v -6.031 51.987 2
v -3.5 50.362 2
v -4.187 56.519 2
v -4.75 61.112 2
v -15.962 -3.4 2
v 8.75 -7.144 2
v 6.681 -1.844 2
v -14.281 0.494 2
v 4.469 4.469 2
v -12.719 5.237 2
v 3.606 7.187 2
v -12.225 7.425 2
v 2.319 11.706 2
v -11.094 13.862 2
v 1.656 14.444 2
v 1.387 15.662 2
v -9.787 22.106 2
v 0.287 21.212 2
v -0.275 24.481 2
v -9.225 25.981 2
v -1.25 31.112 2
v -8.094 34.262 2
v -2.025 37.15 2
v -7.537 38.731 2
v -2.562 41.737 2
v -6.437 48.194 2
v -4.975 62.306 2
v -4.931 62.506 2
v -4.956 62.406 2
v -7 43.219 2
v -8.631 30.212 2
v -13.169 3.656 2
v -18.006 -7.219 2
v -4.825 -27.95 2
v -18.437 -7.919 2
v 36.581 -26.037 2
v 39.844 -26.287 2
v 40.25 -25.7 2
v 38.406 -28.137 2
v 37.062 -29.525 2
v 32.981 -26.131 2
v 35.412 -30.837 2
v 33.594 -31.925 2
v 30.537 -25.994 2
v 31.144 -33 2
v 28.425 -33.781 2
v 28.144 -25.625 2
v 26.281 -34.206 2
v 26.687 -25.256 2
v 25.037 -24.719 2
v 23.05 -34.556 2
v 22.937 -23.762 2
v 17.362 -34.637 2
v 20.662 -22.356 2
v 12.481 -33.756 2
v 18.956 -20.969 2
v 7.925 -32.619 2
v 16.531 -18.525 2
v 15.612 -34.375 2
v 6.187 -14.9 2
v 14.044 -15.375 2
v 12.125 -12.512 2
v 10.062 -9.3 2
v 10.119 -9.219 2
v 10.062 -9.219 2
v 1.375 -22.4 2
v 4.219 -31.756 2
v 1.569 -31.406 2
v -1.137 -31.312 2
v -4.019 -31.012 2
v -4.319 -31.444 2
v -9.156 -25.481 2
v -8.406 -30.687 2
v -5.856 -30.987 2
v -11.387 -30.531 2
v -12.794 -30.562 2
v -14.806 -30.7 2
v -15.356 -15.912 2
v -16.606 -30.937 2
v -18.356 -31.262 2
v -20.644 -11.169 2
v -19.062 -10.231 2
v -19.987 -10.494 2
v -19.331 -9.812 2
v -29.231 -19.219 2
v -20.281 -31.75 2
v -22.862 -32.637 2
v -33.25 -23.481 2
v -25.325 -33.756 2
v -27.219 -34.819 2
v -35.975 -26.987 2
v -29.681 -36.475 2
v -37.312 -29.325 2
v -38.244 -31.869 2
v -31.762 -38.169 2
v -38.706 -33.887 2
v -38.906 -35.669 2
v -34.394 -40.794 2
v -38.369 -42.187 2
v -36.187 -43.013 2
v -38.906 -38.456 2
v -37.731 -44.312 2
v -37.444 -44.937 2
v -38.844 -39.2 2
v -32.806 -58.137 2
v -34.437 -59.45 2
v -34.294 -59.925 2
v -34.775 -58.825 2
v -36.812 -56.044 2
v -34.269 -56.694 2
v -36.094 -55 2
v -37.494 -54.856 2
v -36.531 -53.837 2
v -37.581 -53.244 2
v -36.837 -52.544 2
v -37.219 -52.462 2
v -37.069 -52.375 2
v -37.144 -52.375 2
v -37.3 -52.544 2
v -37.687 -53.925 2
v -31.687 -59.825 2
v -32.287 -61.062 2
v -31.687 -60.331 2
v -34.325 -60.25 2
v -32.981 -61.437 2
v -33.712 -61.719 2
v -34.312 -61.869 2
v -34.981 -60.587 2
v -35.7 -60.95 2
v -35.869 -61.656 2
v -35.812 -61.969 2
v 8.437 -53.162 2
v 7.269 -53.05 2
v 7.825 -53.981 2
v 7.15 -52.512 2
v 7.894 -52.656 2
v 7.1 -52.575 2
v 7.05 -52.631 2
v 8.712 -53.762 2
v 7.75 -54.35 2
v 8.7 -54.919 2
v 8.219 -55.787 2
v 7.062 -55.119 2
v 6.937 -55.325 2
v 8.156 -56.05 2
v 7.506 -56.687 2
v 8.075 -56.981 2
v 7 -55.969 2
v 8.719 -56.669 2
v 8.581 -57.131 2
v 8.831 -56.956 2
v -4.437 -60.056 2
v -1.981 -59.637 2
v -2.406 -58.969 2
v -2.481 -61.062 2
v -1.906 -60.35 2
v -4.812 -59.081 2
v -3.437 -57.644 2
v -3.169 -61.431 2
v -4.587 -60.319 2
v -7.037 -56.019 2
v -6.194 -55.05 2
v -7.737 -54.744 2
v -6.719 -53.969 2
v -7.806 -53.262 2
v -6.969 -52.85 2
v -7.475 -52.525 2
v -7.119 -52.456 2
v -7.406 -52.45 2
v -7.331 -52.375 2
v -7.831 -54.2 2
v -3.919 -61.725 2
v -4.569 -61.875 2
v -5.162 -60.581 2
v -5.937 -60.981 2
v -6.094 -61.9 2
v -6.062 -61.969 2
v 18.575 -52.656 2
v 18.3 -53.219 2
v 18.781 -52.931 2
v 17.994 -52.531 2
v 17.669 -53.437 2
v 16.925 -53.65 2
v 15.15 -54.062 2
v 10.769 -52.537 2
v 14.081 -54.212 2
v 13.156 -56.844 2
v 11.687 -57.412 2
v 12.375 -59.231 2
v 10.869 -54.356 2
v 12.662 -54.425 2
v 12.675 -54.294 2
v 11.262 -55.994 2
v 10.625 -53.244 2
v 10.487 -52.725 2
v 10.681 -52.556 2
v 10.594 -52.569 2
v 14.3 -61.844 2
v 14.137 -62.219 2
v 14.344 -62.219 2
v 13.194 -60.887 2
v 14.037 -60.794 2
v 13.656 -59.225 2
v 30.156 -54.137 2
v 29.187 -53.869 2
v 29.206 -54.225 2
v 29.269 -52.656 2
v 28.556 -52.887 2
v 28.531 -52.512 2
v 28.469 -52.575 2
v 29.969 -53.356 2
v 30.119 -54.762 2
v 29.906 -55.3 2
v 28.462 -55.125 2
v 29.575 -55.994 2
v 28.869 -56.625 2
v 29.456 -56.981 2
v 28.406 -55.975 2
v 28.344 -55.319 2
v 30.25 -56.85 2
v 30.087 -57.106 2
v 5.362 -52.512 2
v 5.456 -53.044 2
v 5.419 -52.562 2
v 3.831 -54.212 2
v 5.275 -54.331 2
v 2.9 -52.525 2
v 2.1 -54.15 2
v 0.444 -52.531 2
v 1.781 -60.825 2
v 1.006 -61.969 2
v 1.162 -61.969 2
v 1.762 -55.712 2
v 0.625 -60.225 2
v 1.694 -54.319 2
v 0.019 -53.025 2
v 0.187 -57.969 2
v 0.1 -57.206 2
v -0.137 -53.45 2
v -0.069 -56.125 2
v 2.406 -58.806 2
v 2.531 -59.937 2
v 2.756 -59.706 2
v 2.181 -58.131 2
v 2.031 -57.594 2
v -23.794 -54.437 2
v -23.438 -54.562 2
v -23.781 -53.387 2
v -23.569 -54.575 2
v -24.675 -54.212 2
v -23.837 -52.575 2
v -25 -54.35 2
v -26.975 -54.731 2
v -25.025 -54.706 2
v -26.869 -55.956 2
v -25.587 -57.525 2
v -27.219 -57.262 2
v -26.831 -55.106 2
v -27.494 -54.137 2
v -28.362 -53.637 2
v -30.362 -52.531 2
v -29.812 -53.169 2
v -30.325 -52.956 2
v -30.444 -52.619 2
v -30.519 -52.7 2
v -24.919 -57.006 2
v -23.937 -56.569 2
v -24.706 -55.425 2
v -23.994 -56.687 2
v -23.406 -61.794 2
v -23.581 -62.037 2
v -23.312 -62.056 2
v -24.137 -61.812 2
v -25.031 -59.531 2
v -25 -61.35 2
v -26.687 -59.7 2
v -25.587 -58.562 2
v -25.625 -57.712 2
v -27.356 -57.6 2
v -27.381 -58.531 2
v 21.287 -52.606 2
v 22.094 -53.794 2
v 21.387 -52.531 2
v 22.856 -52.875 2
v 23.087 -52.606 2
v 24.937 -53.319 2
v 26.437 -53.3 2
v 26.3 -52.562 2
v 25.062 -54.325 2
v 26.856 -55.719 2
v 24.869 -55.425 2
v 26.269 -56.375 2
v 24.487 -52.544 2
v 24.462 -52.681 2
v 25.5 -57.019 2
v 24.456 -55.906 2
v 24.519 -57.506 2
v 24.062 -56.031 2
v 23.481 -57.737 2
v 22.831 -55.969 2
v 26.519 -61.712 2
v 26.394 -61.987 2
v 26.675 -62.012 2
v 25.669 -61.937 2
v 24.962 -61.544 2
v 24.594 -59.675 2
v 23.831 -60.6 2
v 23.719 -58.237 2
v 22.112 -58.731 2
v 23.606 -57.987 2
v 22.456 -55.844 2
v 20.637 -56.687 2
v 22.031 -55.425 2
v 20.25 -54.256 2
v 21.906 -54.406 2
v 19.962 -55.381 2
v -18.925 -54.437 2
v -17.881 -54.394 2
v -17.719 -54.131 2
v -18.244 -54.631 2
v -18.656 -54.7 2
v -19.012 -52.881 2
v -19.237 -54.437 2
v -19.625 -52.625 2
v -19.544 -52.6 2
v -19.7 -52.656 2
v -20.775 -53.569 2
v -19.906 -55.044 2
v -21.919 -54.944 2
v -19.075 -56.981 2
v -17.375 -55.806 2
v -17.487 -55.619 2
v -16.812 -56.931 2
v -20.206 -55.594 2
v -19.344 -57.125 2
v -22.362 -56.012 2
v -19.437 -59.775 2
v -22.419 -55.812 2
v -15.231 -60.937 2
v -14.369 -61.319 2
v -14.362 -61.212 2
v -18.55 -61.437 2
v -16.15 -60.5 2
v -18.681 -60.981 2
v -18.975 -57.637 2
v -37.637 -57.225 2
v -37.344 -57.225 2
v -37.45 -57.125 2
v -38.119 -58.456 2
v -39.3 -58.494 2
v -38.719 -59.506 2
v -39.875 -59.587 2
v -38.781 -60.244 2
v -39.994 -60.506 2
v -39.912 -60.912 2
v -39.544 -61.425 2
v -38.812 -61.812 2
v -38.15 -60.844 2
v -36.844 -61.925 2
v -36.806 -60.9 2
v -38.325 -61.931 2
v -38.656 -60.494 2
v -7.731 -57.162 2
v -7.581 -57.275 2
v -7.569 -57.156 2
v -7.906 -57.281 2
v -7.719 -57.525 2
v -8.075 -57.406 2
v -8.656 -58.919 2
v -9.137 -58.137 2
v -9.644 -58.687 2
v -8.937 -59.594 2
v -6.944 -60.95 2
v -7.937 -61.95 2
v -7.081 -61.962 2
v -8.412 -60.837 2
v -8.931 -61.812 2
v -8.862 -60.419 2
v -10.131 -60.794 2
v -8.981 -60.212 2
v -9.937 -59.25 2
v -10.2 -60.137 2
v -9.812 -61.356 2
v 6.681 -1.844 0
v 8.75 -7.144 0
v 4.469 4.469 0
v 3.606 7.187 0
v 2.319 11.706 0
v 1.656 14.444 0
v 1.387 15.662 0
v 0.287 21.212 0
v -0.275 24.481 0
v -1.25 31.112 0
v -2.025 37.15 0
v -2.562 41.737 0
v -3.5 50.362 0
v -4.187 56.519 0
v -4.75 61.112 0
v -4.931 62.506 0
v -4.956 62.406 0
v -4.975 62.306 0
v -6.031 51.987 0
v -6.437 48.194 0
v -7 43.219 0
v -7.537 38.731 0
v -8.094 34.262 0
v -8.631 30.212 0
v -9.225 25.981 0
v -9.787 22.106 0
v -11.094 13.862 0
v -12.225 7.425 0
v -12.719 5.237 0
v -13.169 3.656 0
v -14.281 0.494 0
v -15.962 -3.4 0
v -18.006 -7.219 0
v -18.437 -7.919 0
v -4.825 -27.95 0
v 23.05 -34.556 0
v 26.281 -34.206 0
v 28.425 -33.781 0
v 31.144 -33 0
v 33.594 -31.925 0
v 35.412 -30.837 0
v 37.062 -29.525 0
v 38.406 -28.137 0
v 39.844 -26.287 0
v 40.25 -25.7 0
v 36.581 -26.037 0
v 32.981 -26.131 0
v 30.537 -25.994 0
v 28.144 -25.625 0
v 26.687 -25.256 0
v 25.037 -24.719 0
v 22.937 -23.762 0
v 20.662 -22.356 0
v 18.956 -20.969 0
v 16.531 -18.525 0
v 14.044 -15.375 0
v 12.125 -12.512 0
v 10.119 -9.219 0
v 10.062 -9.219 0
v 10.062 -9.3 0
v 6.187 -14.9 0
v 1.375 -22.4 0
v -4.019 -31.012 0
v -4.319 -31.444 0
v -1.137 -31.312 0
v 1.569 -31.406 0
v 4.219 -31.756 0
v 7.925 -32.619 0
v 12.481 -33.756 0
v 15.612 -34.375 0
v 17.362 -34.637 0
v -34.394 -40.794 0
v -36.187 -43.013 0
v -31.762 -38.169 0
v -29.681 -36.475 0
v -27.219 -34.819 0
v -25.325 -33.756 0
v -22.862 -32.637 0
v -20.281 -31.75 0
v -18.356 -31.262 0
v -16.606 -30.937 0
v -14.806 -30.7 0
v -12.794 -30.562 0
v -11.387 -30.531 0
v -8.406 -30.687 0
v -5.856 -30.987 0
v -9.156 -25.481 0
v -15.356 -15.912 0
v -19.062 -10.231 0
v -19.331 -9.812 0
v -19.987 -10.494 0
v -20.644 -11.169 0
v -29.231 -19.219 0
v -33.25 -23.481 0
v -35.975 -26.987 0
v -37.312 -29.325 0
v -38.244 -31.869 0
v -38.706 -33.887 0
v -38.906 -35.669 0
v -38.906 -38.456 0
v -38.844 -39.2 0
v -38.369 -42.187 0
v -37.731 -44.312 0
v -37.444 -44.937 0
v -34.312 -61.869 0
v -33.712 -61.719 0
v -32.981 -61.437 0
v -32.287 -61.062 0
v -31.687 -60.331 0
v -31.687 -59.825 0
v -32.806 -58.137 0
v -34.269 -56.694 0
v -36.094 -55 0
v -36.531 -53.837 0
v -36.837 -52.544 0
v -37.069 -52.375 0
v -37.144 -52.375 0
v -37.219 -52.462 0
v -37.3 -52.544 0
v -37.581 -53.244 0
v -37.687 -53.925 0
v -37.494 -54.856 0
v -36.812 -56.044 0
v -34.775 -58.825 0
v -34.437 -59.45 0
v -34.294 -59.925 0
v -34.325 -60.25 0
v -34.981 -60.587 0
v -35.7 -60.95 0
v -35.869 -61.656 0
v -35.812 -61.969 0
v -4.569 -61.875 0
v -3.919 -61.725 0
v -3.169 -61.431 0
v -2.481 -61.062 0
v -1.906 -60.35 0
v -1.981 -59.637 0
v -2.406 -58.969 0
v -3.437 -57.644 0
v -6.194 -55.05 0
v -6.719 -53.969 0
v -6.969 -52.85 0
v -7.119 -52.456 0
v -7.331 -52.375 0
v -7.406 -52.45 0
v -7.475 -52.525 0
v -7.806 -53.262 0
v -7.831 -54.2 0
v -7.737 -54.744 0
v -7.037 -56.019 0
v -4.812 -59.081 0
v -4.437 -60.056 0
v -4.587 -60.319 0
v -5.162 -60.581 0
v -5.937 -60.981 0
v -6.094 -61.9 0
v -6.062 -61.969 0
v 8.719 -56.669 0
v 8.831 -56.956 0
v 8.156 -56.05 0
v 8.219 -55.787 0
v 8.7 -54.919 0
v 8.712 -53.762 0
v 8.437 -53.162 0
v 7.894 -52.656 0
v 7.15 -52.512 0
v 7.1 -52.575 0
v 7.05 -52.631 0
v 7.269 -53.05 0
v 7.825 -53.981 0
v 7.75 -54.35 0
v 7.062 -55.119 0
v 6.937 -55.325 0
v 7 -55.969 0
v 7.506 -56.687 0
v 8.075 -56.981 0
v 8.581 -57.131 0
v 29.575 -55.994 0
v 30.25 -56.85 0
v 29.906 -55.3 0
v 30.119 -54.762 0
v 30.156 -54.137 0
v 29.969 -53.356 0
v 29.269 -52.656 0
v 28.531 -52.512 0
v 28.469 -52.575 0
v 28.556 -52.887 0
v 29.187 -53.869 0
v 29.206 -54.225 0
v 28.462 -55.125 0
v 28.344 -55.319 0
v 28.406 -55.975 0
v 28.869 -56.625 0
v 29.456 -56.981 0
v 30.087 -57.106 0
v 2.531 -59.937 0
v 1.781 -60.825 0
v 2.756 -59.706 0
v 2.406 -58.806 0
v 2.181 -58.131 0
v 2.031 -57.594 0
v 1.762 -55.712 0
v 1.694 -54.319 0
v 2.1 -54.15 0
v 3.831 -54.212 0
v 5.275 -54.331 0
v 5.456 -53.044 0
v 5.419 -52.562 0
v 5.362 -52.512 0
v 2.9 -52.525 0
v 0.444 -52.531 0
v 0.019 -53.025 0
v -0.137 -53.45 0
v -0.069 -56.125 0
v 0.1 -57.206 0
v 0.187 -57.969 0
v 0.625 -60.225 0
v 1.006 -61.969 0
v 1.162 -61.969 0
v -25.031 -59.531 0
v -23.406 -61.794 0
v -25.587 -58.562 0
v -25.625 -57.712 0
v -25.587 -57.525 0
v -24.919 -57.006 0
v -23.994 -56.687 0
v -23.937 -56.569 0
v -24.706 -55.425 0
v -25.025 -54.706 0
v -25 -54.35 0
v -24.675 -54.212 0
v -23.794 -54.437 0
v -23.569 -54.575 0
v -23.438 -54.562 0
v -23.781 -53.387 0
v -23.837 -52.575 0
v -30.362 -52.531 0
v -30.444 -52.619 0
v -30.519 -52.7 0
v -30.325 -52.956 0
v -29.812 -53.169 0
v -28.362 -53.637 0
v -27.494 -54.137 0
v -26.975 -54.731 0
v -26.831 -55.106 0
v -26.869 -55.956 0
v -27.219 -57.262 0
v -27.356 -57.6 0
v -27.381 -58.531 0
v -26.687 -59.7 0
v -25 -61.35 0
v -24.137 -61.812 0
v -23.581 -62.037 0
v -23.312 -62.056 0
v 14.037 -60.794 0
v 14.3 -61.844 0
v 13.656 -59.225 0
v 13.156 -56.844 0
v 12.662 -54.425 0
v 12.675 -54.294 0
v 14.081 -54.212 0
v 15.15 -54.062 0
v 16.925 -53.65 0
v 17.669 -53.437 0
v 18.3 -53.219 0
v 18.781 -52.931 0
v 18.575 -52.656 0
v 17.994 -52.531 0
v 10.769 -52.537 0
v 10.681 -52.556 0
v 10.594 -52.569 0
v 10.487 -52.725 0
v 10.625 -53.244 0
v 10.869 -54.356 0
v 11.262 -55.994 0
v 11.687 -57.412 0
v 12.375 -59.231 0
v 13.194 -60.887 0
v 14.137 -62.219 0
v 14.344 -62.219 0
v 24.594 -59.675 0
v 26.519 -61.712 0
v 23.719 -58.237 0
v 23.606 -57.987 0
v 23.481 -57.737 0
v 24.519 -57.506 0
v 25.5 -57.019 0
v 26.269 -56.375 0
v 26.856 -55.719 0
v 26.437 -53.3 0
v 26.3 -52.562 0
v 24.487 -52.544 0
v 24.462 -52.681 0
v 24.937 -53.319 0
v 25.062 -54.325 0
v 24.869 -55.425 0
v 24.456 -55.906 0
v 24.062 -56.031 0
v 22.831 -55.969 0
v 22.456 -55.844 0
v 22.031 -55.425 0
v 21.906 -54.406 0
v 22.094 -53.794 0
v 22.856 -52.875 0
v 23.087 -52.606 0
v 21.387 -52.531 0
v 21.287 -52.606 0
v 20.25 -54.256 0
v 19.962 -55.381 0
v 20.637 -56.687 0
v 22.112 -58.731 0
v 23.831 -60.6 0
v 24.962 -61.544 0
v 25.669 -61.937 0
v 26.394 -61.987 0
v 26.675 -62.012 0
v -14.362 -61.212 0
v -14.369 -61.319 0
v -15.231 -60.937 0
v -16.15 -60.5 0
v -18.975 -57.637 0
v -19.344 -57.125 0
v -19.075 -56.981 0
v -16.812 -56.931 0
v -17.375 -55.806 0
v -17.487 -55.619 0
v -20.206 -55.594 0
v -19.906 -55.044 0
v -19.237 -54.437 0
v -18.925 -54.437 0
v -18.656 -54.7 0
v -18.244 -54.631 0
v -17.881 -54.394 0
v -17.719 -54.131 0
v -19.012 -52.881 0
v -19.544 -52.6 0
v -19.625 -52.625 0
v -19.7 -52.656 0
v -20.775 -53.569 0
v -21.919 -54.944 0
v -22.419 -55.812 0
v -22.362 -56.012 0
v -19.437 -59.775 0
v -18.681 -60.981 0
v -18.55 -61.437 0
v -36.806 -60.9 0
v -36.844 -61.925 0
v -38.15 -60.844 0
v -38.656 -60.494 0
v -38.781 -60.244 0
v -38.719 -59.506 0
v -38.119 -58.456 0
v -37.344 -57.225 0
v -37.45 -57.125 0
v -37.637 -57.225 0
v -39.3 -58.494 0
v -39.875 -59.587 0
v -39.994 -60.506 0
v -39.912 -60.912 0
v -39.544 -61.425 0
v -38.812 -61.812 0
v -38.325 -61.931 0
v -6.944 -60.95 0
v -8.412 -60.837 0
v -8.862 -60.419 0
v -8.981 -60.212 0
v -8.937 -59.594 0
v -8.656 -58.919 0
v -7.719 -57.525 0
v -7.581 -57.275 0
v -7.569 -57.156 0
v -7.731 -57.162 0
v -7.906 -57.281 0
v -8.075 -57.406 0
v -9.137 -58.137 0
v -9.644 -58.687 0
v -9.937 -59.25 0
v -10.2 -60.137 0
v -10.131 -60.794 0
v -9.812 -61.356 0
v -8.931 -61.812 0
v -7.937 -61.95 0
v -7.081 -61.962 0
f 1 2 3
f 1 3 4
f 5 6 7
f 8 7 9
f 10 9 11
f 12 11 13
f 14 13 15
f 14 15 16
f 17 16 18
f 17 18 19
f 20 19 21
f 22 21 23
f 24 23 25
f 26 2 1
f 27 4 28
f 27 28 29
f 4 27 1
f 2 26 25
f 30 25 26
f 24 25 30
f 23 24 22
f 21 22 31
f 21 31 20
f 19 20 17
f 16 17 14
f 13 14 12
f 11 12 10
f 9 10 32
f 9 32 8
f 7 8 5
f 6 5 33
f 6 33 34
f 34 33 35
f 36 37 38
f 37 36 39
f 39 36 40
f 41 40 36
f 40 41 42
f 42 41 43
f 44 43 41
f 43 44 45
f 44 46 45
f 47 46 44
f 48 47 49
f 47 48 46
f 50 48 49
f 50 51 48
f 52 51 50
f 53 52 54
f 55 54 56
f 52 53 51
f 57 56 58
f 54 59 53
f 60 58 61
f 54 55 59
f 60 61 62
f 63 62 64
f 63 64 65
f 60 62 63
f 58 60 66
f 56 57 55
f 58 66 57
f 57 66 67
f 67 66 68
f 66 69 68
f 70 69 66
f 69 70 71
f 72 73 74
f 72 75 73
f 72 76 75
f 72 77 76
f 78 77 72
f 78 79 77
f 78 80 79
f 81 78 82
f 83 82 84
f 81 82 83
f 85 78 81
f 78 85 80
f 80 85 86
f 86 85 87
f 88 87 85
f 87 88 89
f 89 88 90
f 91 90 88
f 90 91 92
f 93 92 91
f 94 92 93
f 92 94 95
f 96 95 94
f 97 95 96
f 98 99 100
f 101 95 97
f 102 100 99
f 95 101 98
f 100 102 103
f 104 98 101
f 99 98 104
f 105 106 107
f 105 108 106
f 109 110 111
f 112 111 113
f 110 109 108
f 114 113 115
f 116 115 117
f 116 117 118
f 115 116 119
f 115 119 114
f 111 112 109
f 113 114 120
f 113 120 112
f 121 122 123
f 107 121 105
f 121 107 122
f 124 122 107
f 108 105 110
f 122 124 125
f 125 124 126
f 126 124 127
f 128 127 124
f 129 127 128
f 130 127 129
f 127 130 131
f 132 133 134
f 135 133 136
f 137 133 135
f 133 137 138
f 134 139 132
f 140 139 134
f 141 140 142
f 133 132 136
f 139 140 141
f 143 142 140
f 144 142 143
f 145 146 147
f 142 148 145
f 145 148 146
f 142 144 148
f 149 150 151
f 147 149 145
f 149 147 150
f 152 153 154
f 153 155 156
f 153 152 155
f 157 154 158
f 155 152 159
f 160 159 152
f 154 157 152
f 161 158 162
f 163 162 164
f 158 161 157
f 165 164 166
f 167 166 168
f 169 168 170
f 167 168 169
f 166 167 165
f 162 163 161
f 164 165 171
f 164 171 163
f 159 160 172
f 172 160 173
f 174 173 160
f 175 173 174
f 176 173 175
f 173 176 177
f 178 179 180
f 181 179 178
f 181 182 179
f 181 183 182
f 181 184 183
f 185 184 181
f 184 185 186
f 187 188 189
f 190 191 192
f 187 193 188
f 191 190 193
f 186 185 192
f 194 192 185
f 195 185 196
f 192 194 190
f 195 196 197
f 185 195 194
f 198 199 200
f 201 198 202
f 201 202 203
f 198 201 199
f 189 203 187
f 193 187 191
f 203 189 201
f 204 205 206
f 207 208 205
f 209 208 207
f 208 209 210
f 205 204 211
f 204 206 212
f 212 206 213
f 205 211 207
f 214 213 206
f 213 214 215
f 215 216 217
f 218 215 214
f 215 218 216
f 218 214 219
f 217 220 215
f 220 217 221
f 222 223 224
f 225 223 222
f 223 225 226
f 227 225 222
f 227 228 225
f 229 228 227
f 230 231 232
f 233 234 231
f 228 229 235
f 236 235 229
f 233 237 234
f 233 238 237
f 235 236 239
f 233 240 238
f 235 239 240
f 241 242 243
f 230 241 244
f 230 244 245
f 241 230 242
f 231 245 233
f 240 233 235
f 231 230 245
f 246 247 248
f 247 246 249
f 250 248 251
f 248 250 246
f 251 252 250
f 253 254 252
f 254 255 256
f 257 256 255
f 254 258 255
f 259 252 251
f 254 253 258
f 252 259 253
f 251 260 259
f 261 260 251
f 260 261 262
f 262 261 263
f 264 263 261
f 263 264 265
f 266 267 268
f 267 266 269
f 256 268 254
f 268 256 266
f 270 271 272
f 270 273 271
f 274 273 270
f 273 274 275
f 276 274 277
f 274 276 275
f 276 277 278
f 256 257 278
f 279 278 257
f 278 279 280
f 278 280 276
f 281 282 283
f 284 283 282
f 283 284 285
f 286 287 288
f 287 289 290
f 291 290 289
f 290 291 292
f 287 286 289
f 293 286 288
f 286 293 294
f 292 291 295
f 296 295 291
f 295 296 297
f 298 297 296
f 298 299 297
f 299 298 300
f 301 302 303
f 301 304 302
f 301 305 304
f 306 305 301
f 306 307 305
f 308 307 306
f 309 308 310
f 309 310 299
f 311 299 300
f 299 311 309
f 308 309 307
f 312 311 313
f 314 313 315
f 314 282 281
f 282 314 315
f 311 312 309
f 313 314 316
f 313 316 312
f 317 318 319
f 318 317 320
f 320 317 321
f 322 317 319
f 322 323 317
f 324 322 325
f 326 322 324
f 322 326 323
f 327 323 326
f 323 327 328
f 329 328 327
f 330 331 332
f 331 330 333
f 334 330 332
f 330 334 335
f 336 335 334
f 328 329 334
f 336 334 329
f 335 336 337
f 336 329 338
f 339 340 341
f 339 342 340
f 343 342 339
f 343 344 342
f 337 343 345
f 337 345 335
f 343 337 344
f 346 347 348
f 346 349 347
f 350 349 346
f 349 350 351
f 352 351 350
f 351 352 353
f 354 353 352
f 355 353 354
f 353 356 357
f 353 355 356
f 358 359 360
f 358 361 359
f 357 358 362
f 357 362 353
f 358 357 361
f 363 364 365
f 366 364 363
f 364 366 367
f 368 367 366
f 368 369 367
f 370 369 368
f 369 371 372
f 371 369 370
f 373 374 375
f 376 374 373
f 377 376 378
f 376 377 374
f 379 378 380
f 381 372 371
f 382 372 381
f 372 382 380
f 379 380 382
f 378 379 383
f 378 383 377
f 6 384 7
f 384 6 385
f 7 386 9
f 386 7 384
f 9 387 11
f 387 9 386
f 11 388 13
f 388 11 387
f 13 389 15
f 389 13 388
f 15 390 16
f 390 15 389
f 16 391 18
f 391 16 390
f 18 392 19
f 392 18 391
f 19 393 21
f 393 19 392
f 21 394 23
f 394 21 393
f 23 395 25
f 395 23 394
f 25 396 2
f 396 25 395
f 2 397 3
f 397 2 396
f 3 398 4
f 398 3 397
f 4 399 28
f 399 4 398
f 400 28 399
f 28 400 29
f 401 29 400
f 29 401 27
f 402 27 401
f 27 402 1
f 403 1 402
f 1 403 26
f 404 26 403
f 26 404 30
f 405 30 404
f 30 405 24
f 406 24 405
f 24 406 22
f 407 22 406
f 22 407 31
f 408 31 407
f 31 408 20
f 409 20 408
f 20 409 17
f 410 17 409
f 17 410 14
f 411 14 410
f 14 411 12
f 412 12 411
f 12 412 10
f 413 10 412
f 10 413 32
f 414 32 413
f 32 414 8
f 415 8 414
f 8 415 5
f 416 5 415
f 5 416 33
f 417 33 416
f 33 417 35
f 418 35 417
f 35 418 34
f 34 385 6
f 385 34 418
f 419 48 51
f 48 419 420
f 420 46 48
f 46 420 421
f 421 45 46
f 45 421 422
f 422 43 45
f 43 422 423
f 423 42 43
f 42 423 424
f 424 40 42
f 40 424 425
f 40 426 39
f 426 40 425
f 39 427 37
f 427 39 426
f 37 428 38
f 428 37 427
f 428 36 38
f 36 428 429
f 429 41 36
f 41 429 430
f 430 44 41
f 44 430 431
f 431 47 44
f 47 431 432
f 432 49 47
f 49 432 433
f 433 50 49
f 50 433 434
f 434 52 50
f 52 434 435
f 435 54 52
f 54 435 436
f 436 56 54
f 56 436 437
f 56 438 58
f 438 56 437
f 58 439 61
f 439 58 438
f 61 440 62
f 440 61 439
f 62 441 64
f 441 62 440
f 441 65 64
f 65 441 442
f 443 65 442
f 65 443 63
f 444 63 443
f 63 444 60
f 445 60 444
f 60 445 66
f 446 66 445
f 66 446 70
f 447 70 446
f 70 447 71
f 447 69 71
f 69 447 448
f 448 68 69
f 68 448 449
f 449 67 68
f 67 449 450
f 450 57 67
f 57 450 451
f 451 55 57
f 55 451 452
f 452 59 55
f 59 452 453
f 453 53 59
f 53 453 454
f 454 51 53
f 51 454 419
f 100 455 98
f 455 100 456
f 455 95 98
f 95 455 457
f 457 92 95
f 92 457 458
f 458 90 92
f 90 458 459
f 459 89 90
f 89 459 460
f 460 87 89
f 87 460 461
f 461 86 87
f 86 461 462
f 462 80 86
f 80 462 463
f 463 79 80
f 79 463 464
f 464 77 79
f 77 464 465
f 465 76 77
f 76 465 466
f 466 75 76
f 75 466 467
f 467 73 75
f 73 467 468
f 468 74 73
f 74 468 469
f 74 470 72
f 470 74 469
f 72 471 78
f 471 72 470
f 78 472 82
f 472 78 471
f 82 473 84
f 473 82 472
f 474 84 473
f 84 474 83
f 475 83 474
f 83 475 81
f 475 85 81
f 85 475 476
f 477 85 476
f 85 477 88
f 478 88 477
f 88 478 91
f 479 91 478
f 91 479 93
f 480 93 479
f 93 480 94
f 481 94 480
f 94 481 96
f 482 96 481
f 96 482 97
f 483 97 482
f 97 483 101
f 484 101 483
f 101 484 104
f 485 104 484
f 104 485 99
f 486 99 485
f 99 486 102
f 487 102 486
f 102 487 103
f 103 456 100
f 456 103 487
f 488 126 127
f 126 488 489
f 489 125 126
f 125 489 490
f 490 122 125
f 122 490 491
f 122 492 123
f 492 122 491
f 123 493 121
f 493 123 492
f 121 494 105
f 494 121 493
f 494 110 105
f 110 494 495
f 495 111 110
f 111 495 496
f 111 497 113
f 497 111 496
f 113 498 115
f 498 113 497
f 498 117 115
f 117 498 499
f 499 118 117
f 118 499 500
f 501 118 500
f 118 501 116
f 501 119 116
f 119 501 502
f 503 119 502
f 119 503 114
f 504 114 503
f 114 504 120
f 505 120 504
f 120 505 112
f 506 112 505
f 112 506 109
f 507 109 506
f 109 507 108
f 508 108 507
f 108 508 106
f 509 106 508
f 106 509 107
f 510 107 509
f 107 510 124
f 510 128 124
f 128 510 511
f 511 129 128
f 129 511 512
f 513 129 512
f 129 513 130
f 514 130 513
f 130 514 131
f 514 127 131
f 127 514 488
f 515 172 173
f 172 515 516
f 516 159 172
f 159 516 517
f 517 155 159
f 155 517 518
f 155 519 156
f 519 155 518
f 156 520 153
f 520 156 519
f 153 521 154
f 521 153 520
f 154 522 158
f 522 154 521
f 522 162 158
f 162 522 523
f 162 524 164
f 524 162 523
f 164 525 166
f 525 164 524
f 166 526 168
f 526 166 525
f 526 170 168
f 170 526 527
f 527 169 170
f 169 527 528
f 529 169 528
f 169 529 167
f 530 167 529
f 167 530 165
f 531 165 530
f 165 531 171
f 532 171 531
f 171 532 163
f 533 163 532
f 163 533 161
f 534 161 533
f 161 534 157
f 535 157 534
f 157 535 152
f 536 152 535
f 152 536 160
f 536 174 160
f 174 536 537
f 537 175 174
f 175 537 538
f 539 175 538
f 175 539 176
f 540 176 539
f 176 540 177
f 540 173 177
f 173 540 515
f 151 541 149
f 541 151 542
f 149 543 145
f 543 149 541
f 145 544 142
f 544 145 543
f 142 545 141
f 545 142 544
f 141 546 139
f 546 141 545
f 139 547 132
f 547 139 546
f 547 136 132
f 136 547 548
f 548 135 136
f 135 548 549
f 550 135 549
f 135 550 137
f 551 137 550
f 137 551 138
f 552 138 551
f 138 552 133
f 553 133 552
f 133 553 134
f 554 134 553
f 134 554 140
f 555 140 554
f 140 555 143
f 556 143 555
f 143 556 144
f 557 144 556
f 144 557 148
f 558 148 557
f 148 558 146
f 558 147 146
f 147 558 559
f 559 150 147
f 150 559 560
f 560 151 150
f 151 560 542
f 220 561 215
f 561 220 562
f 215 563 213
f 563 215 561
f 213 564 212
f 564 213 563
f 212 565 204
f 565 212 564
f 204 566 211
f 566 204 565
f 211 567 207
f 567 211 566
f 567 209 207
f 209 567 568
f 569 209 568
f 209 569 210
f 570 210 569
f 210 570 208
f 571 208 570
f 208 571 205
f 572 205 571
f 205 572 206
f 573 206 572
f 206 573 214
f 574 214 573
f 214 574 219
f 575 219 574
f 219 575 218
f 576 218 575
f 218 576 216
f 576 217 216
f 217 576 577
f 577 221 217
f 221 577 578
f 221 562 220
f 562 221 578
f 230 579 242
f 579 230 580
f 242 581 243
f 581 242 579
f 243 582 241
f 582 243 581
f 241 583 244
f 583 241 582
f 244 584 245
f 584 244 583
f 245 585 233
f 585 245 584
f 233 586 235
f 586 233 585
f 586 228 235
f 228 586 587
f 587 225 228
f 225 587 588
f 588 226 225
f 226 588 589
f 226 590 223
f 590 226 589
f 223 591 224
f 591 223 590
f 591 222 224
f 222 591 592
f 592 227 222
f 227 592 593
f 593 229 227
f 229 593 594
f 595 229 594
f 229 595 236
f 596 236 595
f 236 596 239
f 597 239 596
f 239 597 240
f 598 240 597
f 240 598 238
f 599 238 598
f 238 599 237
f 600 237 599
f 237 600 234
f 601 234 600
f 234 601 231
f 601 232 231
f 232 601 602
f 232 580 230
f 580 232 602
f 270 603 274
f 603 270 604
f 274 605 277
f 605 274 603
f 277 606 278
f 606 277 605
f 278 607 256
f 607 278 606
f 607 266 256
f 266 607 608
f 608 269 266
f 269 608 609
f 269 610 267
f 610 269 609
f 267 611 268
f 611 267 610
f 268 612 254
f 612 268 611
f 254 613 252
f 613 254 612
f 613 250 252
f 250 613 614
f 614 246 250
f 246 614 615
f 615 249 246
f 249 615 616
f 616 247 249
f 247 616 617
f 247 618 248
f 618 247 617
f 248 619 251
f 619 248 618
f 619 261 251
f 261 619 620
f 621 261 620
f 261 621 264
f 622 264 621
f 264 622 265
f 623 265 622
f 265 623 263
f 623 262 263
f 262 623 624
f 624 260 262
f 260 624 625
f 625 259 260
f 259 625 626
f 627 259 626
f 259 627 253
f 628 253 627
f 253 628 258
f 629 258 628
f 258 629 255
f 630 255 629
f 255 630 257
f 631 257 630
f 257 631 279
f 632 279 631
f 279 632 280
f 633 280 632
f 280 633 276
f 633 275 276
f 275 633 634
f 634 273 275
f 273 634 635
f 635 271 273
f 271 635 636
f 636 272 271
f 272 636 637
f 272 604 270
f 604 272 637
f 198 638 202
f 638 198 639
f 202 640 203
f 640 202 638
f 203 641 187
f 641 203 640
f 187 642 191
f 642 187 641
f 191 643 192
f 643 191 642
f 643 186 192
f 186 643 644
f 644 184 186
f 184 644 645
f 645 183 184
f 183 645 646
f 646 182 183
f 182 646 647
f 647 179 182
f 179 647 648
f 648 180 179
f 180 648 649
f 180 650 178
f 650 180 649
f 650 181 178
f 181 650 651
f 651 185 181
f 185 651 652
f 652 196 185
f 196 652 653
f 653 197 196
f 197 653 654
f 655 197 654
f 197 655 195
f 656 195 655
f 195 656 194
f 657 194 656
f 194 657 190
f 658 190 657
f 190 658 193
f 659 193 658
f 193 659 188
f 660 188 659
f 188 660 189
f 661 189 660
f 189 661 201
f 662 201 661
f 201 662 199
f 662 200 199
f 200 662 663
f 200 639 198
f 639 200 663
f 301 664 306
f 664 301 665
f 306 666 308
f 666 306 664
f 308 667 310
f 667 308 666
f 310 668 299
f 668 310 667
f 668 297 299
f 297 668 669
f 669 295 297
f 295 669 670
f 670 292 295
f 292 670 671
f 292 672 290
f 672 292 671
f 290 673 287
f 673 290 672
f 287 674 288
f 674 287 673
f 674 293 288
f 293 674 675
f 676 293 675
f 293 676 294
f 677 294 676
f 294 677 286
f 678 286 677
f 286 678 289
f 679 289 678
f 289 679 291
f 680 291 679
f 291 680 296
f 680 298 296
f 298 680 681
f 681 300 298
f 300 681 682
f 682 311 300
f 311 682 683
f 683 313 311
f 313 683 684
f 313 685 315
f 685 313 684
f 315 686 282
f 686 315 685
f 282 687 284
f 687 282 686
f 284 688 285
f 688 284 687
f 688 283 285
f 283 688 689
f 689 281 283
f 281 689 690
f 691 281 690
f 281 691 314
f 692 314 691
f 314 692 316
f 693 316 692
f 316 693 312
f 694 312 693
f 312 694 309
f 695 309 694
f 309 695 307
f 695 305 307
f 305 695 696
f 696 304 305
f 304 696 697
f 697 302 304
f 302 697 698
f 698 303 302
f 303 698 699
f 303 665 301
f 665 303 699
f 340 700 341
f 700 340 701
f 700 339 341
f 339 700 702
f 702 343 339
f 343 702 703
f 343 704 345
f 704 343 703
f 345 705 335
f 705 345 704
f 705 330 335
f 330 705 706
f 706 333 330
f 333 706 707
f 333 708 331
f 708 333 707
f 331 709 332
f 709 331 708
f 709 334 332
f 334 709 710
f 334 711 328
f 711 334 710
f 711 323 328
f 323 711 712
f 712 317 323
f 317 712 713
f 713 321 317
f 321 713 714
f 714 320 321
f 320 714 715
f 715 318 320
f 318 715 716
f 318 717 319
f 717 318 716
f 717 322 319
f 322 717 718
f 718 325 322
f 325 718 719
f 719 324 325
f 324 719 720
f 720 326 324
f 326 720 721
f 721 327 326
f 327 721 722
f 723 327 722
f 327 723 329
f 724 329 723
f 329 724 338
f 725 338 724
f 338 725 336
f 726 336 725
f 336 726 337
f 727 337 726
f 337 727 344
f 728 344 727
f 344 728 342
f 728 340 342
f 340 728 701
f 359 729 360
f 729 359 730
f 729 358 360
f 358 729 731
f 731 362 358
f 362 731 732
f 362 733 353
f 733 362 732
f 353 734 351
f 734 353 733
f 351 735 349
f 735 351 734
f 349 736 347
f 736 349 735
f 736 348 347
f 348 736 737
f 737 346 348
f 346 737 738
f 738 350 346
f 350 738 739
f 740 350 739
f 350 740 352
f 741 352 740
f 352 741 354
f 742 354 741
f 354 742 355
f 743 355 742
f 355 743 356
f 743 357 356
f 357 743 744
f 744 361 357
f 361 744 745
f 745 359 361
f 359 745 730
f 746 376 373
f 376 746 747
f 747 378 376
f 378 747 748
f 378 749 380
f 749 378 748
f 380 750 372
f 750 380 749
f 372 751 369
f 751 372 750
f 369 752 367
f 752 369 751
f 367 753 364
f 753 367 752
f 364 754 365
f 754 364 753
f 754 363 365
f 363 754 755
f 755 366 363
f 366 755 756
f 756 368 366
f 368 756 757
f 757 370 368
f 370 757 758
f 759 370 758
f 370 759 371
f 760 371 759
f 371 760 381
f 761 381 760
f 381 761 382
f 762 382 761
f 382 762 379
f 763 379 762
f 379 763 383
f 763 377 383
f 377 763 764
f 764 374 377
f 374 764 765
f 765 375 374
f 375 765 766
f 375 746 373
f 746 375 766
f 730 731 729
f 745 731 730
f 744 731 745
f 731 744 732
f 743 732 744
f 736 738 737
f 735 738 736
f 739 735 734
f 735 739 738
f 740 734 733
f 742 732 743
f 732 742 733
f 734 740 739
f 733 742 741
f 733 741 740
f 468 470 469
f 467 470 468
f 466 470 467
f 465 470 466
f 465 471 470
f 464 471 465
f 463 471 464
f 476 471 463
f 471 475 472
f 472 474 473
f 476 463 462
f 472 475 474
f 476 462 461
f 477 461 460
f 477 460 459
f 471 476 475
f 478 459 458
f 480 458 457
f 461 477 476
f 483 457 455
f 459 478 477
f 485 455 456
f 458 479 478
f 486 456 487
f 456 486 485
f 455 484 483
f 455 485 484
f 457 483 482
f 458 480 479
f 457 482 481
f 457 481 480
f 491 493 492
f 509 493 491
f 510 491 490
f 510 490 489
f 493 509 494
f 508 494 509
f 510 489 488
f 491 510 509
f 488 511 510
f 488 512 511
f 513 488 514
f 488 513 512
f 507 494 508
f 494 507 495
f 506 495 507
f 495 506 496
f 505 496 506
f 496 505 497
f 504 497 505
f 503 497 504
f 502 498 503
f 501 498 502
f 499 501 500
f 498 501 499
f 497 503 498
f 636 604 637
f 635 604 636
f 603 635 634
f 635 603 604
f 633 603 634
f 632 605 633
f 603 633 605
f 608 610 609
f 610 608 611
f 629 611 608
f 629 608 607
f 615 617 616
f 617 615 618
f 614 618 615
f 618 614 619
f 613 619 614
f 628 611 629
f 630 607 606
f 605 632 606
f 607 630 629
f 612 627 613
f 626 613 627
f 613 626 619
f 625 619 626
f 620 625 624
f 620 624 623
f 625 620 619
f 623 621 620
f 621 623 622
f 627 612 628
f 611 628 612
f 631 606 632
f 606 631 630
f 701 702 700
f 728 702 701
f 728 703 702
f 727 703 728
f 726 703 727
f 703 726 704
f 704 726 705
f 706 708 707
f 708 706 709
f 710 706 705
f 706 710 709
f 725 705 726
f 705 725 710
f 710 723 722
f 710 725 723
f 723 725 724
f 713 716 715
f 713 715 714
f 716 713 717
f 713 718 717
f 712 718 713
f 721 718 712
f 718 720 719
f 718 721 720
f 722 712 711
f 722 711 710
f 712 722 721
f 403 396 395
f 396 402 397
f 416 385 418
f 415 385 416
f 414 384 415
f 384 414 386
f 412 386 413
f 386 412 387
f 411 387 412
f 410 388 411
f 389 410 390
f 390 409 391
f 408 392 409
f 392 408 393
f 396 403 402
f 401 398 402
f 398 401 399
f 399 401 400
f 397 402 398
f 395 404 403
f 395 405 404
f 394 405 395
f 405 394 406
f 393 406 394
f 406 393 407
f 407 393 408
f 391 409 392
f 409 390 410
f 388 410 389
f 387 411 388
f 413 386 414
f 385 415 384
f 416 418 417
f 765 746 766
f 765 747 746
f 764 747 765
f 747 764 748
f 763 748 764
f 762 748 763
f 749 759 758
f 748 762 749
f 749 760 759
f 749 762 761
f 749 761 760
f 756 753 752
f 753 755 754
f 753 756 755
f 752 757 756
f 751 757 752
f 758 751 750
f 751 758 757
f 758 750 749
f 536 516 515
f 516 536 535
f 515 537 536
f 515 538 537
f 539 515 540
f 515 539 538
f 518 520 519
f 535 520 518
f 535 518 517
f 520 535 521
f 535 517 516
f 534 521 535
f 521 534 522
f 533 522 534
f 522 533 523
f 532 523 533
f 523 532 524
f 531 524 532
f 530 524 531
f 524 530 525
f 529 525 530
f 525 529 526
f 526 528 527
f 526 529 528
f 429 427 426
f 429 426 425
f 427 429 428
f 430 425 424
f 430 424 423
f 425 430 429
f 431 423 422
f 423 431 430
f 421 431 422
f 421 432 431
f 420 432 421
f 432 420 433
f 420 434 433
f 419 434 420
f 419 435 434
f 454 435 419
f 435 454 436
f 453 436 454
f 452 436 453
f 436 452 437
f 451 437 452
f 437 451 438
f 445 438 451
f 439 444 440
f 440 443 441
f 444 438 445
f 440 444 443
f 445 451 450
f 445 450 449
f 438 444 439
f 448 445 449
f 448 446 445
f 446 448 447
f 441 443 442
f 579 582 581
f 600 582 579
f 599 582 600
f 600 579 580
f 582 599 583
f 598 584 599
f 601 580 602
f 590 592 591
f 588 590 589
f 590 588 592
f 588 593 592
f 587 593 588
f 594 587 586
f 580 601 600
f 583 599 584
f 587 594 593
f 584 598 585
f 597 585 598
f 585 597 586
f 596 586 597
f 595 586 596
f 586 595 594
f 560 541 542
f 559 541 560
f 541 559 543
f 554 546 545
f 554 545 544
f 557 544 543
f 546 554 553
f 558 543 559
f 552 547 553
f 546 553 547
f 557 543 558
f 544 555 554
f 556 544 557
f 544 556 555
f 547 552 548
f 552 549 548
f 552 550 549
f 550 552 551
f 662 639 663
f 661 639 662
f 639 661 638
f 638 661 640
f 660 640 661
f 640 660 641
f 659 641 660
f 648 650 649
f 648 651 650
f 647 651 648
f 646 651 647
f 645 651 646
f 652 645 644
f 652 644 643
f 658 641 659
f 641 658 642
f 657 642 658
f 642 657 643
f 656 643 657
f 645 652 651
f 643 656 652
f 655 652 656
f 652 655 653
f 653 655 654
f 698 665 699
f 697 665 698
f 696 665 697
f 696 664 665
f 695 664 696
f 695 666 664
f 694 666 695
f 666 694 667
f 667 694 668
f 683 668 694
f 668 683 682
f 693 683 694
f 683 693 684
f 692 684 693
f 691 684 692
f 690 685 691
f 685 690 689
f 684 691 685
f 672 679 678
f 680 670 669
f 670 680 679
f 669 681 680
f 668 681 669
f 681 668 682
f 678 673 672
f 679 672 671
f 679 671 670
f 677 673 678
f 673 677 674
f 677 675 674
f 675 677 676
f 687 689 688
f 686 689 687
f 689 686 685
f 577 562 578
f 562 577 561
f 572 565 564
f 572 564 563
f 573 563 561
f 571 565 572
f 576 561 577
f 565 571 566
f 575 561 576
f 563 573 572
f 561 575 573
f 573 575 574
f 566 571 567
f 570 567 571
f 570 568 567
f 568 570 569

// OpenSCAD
module 636e1a0543f60c03d630084251ba2aa2_1()
{
 /* Generated by trace2scad version 20150415
    http://aggregate.org/MAKE/TRACE2SCAD/
    Optimized model has 387/4796 original points
 */
 color([0.48, 0.48, 0.48])
 assign(minx=0) /* polygon minx=39 */
 assign(miny=0) /* polygon miny=45 */
 assign(maxx=12880) /* polygon maxx=12880 */
 assign(maxy=20000) /* polygon maxy=20001 */
 assign(dx=maxx-minx)
 assign(dy=maxy-miny)
 assign(maxd=((dx>dy)?dx:dy))
 scale([1/maxd, 1/maxd, 1])
 translate([-minx-dx/2, -miny-dy/2, 0])
 linear_extrude(height=1, convexity=387)
 union() {
  union() {
   polygon([[5647,19985],[5644,19969],[5475,18318],[5410,17711],[5320,16915],[5234,16197],[5145,15482],[5059,14834],[4964,14157],[4874,13537],[4665,12218],[4484,11188],[4405,10838],[4333,10585],[4155,10079],[3886,9456],[3559,8845],[3490,8733],[5668,5528],[7840,8857],[7509,9705],[7155,10715],[7017,11150],[6811,11873],[6705,12311],[6662,12506],[6486,13394],[6396,13917],[6240,14978],[6116,15944],[6030,16678],[5880,18058],[5770,19043],[5680,19778],[5651,20001]], convexity=6);
   polygon([[8050,8518],[8050,8512],[7430,7616],[6660,6416],[5797,5038],[5749,4969],[6258,4990],[6691,4975],[7115,4919],[7708,4781],[8437,4599],[8938,4500],[9218,4458],[10128,4471],[10645,4527],[10988,4595],[11423,4720],[11815,4892],[12106,5066],[12370,5276],[12585,5498],[12815,5794],[12880,5888],[12293,5834],[11717,5819],[11326,5841],[10943,5900],[10710,5959],[10446,6045],[10110,6198],[9746,6423],[9473,6645],[9085,7036],[8687,7540],[8380,7998],[8059,8525],[8050,8525]], convexity=9);
   polygon([[3242,8321],[3137,8213],[1763,6925],[1120,6243],[684,5682],[470,5308],[321,4901],[247,4578],[215,4293],[215,3847],[225,3728],[301,3250],[403,2910],[449,2810],[650,3118],[937,3473],[1358,3893],[1691,4164],[2085,4429],[2388,4599],[2782,4778],[3195,4920],[3503,4998],[3783,5050],[4071,5088],[4393,5110],[4618,5115],[5095,5090],[5503,5042],[4975,5923],[3983,7454],[3390,8363],[3347,8430]], convexity=7);
   polygon([[485,1606],[472,1593],[427,1481],[410,1372],[441,1223],[550,1033],[876,588],[930,488],[953,412],[948,360],[843,306],[728,248],[701,135],[710,85],[950,101],[1046,125],[1163,170],[1274,230],[1370,347],[1370,428],[1191,698],[957,929],[665,1200],[595,1386],[546,1593],[509,1620],[497,1620]], convexity=8);
   polygon([[5255,1608],[5244,1596],[5191,1478],[5187,1328],[5202,1241],[5314,1037],[5670,547],[5730,391],[5706,349],[5614,307],[5490,243],[5465,96],[5470,85],[5709,100],[5813,124],[5933,171],[6043,230],[6135,344],[6123,458],[6055,565],[5890,777],[5449,1192],[5365,1365],[5325,1544],[5301,1607],[5267,1620]], convexity=8);
   polygon([[6904,1596],[6511,1595],[6443,1516],[6418,1448],[6429,1020],[6456,847],[6470,725],[6540,364],[6601,85],[6626,85],[6725,268],[6845,410],[6881,447],[6825,591],[6789,699],[6765,785],[6722,1086],[6711,1309],[6776,1336],[7053,1326],[7284,1307],[7313,1513],[7307,1590],[7298,1598]], convexity=10);
   polygon([[7576,1588],[7568,1579],[7603,1512],[7692,1363],[7680,1304],[7570,1181],[7550,1148],[7560,1045],[7641,930],[7732,883],[7813,859],[7853,887],[7835,933],[7745,1032],[7755,1074],[7832,1213],[7834,1398],[7790,1494],[7703,1575],[7584,1598]], convexity=10);
   polygon([[11000,1593],[10995,1588],[11009,1538],[11110,1381],[11113,1324],[10994,1180],[10975,1149],[10985,1044],[11059,940],[11153,883],[11254,863],[11280,904],[11172,1041],[11225,1152],[11259,1238],[11265,1338],[11235,1463],[11123,1575],[11005,1598]], convexity=10);
   polygon([[1569,1581],[1557,1568],[1588,1527],[1670,1493],[1902,1418],[2041,1338],[2124,1243],[2147,1183],[2141,1047],[2085,838],[2063,784],[2059,635],[2170,448],[2440,184],[2578,110],[2667,74],[2710,71],[2695,113],[2435,475],[2346,630],[2340,766],[2346,796],[2453,879],[2601,930],[2610,949],[2487,1132],[2436,1247],[2440,1304],[2492,1326],[2633,1290],[2669,1268],[2690,1270],[2635,1458],[2626,1588],[1582,1595]], convexity=13);
   polygon([[8149,1591],[8135,1589],[8118,1564],[8140,1481],[8179,1303],[8242,1041],[8310,814],[8420,523],[8551,258],[8702,45],[8735,45],[8728,105],[8686,273],[8625,524],[8545,905],[8466,1292],[8468,1313],[8693,1326],[8864,1350],[9148,1416],[9267,1450],[9368,1485],[9445,1531],[9412,1575],[9319,1595],[8163,1594]], convexity=9);
   polygon([[9854,1589],[9846,1583],[9680,1319],[9634,1139],[9742,930],[9978,603],[10253,304],[10434,153],[10547,90],[10663,82],[10708,78],[10683,126],[10375,452],[10235,682],[10217,722],[10197,762],[10363,799],[10520,877],[10643,980],[10737,1085],[10670,1472],[10648,1590],[10358,1593],[10354,1571],[10430,1469],[10450,1308],[10419,1132],[10353,1055],[10290,1035],[10093,1045],[10033,1065],[9965,1132],[9945,1295],[9975,1393],[10097,1540],[10134,1583],[9862,1595]], convexity=13);
   polygon([[3300,1580],[3288,1575],[3116,1429],[2933,1209],[2853,1070],[2862,1038],[3330,436],[3451,243],[3472,170],[4141,189],[4142,206],[4003,250],[3856,320],[3404,778],[3345,860],[3388,883],[3750,891],[3660,1071],[3642,1101],[3207,1105],[3255,1193],[3362,1290],[3412,1290],[3455,1248],[3521,1259],[3579,1297],[3605,1339],[3398,1539],[3313,1584]], convexity=12);
   polygon([[433,852],[418,844],[152,641],[60,466],[41,319],[54,254],[113,172],[230,110],[308,91],[545,92],[551,256],[336,265],[255,321],[235,361],[245,479],[341,647],[465,844],[448,860]], convexity=8);
   polygon([[5175,835],[5148,815],[4978,698],[4897,610],[4850,520],[4808,378],[4819,273],[4870,183],[5011,110],[5170,88],[5307,86],[5329,248],[5094,266],[5022,333],[5003,366],[5010,465],[5055,573],[5205,796],[5227,836],[5229,855],[5203,854]], convexity=8);
  }
 }
}

module 636e1a0543f60c03d630084251ba2aa2()
{
 /* all layers combined, scaled to within a 1mm cube */
 scale([1, 1, 1/1])
 difference() {
  union() {
   scale([1,1,2]) translate([0,0,-0.5]) 636e1a0543f60c03d630084251ba2aa2_1();
  }
  translate([0,0,-2]) cube([2,2,4],center=true);
 }
}

scale([125, 125, 2]) {
	636e1a0543f60c03d630084251ba2aa2();
}
